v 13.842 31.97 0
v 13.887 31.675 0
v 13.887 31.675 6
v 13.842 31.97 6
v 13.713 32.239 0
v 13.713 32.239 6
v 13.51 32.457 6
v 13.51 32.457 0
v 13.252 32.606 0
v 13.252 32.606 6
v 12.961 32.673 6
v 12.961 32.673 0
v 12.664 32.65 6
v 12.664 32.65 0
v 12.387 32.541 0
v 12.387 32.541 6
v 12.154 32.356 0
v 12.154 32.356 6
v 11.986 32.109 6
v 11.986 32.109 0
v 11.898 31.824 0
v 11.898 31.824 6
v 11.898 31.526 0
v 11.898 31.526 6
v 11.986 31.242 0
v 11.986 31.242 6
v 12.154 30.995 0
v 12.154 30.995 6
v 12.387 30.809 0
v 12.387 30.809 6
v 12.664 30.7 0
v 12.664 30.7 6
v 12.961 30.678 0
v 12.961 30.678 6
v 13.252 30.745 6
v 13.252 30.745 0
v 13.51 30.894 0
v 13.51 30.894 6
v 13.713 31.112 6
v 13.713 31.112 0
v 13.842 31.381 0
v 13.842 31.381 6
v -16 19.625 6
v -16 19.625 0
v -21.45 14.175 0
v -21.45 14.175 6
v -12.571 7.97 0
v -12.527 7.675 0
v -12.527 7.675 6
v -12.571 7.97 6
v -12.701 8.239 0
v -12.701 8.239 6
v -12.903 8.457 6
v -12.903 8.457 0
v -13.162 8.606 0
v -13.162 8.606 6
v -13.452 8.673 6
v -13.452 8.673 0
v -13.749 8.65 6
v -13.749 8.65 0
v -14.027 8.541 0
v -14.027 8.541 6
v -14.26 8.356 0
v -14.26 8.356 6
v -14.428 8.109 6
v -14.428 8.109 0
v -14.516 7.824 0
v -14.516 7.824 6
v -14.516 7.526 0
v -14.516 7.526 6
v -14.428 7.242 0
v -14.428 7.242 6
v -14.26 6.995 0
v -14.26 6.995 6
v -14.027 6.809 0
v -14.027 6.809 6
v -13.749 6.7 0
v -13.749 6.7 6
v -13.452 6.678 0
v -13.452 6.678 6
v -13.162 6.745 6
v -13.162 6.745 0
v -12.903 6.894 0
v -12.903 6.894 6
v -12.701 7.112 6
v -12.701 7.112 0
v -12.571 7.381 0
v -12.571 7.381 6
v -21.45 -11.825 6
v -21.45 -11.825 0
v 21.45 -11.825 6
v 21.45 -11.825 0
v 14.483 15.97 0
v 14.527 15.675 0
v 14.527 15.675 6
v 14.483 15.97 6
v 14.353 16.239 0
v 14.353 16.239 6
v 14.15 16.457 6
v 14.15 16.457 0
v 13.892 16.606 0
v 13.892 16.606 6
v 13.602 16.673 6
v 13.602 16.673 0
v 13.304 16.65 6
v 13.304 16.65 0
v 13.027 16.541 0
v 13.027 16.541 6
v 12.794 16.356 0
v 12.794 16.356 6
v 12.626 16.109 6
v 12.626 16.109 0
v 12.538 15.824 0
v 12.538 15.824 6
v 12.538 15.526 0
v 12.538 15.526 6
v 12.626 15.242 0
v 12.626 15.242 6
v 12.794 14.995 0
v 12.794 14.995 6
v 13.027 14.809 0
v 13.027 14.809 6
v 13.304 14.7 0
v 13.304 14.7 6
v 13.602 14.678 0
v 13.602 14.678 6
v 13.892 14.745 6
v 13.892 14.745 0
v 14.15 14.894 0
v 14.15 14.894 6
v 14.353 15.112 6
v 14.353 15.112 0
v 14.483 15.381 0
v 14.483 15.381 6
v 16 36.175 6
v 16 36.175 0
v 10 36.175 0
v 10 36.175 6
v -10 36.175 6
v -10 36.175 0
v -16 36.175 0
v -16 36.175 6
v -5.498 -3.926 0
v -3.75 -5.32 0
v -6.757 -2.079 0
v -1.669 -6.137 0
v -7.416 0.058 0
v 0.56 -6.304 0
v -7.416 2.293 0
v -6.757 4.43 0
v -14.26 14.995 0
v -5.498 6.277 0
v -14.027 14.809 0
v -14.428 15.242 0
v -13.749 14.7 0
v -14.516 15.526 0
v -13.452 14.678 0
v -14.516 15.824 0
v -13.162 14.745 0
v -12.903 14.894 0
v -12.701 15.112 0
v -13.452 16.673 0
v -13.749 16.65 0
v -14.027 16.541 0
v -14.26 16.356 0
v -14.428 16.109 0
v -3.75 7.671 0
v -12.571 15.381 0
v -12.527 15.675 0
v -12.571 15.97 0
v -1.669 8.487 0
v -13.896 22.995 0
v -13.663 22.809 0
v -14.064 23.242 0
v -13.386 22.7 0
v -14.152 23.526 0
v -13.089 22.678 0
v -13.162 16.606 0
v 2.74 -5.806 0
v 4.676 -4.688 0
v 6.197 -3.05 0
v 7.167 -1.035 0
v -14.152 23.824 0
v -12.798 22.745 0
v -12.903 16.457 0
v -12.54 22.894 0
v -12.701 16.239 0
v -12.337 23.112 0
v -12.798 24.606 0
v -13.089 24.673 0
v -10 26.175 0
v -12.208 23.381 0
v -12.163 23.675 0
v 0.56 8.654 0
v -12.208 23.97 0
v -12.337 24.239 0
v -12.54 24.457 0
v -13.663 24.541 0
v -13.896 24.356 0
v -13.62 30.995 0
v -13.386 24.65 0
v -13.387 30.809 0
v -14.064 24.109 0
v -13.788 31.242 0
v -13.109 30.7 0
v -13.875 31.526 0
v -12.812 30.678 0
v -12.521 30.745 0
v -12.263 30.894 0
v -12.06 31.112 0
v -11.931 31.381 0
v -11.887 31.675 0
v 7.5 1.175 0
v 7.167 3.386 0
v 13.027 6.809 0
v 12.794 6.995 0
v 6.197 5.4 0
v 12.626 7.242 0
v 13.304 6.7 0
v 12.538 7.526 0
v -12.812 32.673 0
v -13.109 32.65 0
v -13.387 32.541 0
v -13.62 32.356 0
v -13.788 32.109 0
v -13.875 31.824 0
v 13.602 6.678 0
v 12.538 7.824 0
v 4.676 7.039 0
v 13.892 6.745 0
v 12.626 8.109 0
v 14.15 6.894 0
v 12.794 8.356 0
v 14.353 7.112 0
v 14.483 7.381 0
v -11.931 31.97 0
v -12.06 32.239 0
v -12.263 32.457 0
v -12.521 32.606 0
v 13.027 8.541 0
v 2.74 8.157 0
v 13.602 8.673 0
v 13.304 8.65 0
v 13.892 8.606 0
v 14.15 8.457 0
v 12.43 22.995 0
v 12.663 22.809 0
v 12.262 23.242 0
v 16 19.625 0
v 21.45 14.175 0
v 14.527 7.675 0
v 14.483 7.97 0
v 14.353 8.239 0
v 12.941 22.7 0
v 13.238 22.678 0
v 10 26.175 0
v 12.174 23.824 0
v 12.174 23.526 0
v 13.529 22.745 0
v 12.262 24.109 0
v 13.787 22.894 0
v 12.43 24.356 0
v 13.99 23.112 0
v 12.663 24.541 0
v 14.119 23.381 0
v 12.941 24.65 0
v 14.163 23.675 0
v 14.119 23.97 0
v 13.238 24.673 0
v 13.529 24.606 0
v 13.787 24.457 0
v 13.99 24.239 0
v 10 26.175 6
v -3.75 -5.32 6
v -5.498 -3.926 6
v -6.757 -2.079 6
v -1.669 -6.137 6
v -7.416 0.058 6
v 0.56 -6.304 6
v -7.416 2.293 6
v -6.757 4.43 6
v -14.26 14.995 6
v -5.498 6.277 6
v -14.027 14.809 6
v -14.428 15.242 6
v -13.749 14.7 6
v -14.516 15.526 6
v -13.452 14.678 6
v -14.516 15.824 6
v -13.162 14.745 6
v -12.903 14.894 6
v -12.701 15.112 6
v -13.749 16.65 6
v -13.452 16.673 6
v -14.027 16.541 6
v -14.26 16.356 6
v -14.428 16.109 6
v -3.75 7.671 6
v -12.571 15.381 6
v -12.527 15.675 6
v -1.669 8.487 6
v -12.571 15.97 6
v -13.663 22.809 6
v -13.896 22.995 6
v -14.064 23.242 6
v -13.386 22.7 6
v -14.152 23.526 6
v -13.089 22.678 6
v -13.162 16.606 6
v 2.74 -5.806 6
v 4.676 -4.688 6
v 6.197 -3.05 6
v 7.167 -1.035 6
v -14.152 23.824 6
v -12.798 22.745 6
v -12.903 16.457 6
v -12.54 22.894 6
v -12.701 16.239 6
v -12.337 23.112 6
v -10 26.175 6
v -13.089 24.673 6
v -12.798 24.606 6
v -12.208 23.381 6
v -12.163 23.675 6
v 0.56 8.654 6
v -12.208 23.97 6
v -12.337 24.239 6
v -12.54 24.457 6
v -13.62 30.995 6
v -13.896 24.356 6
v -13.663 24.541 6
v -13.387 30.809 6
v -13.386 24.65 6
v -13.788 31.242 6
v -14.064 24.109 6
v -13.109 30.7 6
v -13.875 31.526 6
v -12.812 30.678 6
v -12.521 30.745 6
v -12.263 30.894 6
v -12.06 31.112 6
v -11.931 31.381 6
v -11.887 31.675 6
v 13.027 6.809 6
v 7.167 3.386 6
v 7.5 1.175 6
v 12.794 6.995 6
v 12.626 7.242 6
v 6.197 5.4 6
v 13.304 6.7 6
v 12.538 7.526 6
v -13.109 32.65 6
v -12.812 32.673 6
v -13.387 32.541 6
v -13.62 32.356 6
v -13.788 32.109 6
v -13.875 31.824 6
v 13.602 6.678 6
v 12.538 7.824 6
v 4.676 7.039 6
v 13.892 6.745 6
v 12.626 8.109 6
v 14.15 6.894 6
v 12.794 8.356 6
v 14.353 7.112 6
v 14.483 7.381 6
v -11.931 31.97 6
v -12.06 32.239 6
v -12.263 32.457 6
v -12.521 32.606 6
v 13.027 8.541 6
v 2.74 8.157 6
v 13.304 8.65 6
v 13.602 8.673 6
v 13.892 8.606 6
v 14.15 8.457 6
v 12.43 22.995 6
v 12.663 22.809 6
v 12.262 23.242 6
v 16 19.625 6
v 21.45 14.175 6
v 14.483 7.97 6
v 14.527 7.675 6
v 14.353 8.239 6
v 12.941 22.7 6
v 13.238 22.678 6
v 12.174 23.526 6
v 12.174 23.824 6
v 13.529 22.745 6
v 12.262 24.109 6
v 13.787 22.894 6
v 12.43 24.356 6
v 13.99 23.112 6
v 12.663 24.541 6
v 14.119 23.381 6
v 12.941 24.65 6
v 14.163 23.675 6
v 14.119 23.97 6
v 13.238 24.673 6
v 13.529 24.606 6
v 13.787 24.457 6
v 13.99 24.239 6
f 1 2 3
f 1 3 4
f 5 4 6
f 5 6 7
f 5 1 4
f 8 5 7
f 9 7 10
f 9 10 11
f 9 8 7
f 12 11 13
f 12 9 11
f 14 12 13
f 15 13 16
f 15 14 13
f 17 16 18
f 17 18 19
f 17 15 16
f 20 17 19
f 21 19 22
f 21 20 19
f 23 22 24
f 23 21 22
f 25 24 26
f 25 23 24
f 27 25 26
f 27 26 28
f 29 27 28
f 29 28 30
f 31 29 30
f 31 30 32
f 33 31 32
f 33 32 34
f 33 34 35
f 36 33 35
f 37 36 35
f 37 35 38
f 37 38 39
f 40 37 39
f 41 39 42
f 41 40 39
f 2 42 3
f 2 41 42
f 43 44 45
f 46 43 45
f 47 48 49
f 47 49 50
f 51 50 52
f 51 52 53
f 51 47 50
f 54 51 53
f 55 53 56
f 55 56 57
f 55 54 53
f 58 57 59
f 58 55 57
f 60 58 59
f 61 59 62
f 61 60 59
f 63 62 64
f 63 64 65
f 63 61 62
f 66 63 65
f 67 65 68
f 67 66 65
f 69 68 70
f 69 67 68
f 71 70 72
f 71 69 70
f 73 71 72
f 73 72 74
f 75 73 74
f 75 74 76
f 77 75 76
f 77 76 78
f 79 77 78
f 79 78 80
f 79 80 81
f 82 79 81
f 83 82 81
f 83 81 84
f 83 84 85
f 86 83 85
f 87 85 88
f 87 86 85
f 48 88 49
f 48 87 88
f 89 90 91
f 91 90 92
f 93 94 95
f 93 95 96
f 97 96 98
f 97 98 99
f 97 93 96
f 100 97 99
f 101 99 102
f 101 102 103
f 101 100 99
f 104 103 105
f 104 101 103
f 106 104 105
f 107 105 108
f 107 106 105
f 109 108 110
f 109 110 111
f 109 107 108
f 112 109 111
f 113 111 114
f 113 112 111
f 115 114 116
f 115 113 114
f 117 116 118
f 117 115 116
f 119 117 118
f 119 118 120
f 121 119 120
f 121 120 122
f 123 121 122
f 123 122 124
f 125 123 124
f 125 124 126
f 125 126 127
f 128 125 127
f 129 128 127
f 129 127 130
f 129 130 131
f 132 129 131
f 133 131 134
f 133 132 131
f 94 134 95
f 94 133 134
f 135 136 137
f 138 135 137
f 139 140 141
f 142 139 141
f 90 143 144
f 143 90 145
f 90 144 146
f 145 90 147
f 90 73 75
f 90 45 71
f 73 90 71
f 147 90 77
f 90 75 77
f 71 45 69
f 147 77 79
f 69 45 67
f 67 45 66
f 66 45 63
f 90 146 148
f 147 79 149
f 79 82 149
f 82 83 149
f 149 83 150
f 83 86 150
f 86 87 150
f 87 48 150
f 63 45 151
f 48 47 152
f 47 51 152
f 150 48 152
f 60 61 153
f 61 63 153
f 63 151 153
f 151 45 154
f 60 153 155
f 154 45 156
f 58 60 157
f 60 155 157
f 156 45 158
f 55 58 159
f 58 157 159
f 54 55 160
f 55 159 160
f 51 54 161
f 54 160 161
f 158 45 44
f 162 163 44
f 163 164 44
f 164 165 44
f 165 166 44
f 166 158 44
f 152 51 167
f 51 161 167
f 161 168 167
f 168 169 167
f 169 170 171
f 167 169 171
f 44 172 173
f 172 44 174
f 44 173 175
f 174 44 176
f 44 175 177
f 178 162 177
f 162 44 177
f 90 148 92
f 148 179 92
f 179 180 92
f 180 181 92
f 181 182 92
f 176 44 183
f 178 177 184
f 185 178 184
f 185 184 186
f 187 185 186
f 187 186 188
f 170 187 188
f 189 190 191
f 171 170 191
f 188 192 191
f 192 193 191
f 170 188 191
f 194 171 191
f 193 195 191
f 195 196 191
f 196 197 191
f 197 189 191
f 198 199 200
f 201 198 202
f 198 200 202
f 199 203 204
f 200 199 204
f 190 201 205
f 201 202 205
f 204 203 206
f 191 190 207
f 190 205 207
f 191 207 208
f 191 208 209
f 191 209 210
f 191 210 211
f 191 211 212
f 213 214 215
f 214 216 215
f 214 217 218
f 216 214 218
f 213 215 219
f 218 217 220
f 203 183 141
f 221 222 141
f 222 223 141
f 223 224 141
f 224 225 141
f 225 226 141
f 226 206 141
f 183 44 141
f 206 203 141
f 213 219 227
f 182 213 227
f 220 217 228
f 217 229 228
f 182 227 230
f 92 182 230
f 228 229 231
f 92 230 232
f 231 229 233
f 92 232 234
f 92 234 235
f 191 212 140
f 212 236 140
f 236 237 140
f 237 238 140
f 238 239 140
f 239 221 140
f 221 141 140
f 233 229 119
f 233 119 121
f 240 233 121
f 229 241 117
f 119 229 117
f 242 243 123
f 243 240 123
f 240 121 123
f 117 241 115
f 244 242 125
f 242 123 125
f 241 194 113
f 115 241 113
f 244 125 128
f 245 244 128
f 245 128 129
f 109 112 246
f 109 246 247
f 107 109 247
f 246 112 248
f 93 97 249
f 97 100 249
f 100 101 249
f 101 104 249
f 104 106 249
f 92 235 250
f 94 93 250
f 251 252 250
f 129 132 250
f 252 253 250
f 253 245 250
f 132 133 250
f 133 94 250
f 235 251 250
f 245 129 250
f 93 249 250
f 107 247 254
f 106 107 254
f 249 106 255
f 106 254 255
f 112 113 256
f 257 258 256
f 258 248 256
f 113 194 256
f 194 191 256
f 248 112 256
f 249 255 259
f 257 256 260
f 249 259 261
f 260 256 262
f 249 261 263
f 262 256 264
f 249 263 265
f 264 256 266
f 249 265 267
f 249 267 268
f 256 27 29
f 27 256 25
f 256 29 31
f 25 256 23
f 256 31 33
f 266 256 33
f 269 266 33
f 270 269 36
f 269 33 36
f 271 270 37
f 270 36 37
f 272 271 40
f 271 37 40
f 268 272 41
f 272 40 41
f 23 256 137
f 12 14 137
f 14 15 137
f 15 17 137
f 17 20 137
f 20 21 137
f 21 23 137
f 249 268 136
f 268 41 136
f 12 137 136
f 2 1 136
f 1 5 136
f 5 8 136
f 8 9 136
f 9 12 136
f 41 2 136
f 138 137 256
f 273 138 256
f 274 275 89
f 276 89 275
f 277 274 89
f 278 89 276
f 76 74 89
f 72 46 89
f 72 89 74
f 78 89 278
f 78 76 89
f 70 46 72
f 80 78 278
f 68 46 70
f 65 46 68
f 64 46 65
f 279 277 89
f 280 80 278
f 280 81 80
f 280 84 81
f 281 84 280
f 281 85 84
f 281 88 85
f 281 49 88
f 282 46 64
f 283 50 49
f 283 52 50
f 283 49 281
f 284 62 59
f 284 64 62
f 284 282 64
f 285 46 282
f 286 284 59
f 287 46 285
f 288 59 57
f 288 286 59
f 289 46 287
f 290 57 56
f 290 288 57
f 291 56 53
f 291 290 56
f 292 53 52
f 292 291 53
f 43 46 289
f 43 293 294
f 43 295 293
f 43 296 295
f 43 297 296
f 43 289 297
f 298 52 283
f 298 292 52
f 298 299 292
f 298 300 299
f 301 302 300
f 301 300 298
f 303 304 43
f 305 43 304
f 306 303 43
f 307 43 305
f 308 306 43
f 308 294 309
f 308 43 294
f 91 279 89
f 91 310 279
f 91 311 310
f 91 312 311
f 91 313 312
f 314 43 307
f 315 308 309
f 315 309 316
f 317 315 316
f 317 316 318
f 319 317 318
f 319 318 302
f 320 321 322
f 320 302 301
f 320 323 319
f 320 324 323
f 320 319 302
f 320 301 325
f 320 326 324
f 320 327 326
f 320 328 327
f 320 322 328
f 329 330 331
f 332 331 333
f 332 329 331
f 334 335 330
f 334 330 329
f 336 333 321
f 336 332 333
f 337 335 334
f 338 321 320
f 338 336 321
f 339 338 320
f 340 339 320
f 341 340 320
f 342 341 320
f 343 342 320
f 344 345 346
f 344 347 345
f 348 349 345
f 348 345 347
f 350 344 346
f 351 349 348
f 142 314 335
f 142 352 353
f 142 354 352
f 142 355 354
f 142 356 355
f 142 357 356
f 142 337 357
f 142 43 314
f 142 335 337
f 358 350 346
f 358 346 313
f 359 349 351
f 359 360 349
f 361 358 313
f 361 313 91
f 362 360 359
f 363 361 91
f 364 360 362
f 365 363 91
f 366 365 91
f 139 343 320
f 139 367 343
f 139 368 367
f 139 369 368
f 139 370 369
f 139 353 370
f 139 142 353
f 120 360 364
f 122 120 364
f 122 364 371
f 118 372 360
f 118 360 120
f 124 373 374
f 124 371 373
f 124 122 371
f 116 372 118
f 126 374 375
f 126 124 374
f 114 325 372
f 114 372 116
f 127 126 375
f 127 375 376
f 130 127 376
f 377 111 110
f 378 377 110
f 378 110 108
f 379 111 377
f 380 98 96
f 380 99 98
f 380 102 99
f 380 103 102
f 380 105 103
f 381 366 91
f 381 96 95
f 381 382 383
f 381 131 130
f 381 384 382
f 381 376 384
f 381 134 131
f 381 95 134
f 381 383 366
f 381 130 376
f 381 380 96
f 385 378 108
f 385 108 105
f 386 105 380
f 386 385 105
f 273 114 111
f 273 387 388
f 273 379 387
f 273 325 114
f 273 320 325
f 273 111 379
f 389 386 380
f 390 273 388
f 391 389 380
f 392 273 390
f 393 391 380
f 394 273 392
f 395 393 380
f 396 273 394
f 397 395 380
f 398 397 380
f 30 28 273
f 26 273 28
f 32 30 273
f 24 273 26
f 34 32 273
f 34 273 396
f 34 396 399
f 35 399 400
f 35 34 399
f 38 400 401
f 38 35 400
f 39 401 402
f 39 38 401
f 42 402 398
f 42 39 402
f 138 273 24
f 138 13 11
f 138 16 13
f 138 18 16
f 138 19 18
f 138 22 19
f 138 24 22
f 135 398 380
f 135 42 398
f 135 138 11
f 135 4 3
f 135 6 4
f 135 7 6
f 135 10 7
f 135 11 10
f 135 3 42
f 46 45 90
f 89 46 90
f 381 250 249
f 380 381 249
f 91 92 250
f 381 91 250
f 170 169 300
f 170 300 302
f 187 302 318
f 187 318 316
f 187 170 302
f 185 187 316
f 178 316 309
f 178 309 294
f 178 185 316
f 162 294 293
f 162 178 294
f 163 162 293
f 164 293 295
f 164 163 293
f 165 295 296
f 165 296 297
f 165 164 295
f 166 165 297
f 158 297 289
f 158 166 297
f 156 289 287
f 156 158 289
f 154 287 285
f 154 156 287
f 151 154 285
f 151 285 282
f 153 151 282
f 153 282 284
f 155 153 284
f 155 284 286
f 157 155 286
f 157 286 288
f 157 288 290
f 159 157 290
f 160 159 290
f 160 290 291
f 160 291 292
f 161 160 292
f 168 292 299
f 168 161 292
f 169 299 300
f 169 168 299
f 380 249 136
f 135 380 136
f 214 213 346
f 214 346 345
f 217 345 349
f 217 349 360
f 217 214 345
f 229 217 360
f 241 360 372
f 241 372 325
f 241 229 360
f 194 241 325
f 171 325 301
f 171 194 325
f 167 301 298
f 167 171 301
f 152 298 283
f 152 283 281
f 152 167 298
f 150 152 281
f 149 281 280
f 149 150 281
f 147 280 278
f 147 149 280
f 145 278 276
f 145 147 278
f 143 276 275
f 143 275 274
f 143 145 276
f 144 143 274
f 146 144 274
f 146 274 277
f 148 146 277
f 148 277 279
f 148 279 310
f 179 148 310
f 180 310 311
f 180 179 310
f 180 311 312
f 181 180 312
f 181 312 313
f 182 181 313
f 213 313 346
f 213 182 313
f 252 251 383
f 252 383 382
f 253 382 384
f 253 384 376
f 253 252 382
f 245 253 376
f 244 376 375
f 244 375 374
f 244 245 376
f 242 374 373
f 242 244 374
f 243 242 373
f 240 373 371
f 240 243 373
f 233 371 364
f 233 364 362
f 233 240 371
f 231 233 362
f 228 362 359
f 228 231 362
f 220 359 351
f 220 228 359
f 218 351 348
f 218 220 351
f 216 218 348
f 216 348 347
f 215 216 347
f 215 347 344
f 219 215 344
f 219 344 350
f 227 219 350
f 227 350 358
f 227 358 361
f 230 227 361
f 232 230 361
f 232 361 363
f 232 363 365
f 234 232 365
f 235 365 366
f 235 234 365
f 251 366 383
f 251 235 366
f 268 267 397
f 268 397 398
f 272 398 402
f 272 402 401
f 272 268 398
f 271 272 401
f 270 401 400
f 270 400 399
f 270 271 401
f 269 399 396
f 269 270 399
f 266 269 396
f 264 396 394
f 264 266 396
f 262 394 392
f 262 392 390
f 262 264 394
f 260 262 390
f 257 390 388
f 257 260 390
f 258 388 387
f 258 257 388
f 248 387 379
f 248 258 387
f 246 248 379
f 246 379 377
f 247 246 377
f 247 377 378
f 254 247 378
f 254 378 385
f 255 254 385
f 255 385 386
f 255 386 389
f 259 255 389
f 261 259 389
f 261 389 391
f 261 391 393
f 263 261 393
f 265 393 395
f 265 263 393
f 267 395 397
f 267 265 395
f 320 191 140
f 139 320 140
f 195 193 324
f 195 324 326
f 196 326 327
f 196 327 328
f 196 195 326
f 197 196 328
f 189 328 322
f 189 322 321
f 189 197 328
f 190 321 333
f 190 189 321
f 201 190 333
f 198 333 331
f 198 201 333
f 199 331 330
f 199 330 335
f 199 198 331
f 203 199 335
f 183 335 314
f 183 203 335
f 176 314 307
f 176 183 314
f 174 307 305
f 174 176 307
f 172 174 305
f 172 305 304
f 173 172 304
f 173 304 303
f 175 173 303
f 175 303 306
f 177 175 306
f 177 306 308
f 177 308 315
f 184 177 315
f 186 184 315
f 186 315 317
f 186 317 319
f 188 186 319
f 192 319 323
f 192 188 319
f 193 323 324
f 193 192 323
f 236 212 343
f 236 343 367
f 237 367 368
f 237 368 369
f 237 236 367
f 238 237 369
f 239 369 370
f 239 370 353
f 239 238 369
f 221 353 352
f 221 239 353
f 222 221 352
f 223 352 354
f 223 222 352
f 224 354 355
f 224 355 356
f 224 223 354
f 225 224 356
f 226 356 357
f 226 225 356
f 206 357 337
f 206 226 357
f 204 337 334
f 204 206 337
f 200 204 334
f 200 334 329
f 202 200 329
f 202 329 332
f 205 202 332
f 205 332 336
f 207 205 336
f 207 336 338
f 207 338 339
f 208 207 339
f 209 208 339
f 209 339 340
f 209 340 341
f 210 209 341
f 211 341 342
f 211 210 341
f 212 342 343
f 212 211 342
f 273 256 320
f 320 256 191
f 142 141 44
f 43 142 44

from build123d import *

# Parameters (mm, degrees)
F0_R     = 1
F0_R_2   = 7.5
F1_DEPTH = 6


with BuildPart() as f1:
    # F0 (on Top) → F1 (new body)
    with BuildSketch(Plane.XY):
        Polygon((-10, 36.175396), (-16, 36.175396), (-16, 19.625396), (-21.45, 14.175396), (-21.45, -11.824604), (21.45, -11.824604), (21.45, 14.175396), (16, 19.625396), (16, 36.175396), (10, 36.175396), (10, 26.175396), (-10, 26.175396), align=None)
        with Locations((-13.526969, 7.675396)):
            Circle(F0_R, mode=Mode.SUBTRACT)
        with Locations((0, 1.175396)):
            Circle(F0_R_2, mode=Mode.SUBTRACT)
        with Locations((13.526969, 7.675396)):
            Circle(F0_R, mode=Mode.SUBTRACT)
        with Locations((-13.526969, 15.675396)):
            Circle(F0_R, mode=Mode.SUBTRACT)
        with Locations((-13.163304, 23.675396)):
            Circle(F0_R, mode=Mode.SUBTRACT)
        with Locations((-12.886655, 31.675396)):
            Circle(F0_R, mode=Mode.SUBTRACT)
        with Locations((13.526969, 15.675396)):
            Circle(F0_R, mode=Mode.SUBTRACT)
        with Locations((13.163304, 23.675396)):
            Circle(F0_R, mode=Mode.SUBTRACT)
        with Locations((12.886655, 31.675396)):
            Circle(F0_R, mode=Mode.SUBTRACT)
    extrude(amount=F1_DEPTH)


solid = f1.part
